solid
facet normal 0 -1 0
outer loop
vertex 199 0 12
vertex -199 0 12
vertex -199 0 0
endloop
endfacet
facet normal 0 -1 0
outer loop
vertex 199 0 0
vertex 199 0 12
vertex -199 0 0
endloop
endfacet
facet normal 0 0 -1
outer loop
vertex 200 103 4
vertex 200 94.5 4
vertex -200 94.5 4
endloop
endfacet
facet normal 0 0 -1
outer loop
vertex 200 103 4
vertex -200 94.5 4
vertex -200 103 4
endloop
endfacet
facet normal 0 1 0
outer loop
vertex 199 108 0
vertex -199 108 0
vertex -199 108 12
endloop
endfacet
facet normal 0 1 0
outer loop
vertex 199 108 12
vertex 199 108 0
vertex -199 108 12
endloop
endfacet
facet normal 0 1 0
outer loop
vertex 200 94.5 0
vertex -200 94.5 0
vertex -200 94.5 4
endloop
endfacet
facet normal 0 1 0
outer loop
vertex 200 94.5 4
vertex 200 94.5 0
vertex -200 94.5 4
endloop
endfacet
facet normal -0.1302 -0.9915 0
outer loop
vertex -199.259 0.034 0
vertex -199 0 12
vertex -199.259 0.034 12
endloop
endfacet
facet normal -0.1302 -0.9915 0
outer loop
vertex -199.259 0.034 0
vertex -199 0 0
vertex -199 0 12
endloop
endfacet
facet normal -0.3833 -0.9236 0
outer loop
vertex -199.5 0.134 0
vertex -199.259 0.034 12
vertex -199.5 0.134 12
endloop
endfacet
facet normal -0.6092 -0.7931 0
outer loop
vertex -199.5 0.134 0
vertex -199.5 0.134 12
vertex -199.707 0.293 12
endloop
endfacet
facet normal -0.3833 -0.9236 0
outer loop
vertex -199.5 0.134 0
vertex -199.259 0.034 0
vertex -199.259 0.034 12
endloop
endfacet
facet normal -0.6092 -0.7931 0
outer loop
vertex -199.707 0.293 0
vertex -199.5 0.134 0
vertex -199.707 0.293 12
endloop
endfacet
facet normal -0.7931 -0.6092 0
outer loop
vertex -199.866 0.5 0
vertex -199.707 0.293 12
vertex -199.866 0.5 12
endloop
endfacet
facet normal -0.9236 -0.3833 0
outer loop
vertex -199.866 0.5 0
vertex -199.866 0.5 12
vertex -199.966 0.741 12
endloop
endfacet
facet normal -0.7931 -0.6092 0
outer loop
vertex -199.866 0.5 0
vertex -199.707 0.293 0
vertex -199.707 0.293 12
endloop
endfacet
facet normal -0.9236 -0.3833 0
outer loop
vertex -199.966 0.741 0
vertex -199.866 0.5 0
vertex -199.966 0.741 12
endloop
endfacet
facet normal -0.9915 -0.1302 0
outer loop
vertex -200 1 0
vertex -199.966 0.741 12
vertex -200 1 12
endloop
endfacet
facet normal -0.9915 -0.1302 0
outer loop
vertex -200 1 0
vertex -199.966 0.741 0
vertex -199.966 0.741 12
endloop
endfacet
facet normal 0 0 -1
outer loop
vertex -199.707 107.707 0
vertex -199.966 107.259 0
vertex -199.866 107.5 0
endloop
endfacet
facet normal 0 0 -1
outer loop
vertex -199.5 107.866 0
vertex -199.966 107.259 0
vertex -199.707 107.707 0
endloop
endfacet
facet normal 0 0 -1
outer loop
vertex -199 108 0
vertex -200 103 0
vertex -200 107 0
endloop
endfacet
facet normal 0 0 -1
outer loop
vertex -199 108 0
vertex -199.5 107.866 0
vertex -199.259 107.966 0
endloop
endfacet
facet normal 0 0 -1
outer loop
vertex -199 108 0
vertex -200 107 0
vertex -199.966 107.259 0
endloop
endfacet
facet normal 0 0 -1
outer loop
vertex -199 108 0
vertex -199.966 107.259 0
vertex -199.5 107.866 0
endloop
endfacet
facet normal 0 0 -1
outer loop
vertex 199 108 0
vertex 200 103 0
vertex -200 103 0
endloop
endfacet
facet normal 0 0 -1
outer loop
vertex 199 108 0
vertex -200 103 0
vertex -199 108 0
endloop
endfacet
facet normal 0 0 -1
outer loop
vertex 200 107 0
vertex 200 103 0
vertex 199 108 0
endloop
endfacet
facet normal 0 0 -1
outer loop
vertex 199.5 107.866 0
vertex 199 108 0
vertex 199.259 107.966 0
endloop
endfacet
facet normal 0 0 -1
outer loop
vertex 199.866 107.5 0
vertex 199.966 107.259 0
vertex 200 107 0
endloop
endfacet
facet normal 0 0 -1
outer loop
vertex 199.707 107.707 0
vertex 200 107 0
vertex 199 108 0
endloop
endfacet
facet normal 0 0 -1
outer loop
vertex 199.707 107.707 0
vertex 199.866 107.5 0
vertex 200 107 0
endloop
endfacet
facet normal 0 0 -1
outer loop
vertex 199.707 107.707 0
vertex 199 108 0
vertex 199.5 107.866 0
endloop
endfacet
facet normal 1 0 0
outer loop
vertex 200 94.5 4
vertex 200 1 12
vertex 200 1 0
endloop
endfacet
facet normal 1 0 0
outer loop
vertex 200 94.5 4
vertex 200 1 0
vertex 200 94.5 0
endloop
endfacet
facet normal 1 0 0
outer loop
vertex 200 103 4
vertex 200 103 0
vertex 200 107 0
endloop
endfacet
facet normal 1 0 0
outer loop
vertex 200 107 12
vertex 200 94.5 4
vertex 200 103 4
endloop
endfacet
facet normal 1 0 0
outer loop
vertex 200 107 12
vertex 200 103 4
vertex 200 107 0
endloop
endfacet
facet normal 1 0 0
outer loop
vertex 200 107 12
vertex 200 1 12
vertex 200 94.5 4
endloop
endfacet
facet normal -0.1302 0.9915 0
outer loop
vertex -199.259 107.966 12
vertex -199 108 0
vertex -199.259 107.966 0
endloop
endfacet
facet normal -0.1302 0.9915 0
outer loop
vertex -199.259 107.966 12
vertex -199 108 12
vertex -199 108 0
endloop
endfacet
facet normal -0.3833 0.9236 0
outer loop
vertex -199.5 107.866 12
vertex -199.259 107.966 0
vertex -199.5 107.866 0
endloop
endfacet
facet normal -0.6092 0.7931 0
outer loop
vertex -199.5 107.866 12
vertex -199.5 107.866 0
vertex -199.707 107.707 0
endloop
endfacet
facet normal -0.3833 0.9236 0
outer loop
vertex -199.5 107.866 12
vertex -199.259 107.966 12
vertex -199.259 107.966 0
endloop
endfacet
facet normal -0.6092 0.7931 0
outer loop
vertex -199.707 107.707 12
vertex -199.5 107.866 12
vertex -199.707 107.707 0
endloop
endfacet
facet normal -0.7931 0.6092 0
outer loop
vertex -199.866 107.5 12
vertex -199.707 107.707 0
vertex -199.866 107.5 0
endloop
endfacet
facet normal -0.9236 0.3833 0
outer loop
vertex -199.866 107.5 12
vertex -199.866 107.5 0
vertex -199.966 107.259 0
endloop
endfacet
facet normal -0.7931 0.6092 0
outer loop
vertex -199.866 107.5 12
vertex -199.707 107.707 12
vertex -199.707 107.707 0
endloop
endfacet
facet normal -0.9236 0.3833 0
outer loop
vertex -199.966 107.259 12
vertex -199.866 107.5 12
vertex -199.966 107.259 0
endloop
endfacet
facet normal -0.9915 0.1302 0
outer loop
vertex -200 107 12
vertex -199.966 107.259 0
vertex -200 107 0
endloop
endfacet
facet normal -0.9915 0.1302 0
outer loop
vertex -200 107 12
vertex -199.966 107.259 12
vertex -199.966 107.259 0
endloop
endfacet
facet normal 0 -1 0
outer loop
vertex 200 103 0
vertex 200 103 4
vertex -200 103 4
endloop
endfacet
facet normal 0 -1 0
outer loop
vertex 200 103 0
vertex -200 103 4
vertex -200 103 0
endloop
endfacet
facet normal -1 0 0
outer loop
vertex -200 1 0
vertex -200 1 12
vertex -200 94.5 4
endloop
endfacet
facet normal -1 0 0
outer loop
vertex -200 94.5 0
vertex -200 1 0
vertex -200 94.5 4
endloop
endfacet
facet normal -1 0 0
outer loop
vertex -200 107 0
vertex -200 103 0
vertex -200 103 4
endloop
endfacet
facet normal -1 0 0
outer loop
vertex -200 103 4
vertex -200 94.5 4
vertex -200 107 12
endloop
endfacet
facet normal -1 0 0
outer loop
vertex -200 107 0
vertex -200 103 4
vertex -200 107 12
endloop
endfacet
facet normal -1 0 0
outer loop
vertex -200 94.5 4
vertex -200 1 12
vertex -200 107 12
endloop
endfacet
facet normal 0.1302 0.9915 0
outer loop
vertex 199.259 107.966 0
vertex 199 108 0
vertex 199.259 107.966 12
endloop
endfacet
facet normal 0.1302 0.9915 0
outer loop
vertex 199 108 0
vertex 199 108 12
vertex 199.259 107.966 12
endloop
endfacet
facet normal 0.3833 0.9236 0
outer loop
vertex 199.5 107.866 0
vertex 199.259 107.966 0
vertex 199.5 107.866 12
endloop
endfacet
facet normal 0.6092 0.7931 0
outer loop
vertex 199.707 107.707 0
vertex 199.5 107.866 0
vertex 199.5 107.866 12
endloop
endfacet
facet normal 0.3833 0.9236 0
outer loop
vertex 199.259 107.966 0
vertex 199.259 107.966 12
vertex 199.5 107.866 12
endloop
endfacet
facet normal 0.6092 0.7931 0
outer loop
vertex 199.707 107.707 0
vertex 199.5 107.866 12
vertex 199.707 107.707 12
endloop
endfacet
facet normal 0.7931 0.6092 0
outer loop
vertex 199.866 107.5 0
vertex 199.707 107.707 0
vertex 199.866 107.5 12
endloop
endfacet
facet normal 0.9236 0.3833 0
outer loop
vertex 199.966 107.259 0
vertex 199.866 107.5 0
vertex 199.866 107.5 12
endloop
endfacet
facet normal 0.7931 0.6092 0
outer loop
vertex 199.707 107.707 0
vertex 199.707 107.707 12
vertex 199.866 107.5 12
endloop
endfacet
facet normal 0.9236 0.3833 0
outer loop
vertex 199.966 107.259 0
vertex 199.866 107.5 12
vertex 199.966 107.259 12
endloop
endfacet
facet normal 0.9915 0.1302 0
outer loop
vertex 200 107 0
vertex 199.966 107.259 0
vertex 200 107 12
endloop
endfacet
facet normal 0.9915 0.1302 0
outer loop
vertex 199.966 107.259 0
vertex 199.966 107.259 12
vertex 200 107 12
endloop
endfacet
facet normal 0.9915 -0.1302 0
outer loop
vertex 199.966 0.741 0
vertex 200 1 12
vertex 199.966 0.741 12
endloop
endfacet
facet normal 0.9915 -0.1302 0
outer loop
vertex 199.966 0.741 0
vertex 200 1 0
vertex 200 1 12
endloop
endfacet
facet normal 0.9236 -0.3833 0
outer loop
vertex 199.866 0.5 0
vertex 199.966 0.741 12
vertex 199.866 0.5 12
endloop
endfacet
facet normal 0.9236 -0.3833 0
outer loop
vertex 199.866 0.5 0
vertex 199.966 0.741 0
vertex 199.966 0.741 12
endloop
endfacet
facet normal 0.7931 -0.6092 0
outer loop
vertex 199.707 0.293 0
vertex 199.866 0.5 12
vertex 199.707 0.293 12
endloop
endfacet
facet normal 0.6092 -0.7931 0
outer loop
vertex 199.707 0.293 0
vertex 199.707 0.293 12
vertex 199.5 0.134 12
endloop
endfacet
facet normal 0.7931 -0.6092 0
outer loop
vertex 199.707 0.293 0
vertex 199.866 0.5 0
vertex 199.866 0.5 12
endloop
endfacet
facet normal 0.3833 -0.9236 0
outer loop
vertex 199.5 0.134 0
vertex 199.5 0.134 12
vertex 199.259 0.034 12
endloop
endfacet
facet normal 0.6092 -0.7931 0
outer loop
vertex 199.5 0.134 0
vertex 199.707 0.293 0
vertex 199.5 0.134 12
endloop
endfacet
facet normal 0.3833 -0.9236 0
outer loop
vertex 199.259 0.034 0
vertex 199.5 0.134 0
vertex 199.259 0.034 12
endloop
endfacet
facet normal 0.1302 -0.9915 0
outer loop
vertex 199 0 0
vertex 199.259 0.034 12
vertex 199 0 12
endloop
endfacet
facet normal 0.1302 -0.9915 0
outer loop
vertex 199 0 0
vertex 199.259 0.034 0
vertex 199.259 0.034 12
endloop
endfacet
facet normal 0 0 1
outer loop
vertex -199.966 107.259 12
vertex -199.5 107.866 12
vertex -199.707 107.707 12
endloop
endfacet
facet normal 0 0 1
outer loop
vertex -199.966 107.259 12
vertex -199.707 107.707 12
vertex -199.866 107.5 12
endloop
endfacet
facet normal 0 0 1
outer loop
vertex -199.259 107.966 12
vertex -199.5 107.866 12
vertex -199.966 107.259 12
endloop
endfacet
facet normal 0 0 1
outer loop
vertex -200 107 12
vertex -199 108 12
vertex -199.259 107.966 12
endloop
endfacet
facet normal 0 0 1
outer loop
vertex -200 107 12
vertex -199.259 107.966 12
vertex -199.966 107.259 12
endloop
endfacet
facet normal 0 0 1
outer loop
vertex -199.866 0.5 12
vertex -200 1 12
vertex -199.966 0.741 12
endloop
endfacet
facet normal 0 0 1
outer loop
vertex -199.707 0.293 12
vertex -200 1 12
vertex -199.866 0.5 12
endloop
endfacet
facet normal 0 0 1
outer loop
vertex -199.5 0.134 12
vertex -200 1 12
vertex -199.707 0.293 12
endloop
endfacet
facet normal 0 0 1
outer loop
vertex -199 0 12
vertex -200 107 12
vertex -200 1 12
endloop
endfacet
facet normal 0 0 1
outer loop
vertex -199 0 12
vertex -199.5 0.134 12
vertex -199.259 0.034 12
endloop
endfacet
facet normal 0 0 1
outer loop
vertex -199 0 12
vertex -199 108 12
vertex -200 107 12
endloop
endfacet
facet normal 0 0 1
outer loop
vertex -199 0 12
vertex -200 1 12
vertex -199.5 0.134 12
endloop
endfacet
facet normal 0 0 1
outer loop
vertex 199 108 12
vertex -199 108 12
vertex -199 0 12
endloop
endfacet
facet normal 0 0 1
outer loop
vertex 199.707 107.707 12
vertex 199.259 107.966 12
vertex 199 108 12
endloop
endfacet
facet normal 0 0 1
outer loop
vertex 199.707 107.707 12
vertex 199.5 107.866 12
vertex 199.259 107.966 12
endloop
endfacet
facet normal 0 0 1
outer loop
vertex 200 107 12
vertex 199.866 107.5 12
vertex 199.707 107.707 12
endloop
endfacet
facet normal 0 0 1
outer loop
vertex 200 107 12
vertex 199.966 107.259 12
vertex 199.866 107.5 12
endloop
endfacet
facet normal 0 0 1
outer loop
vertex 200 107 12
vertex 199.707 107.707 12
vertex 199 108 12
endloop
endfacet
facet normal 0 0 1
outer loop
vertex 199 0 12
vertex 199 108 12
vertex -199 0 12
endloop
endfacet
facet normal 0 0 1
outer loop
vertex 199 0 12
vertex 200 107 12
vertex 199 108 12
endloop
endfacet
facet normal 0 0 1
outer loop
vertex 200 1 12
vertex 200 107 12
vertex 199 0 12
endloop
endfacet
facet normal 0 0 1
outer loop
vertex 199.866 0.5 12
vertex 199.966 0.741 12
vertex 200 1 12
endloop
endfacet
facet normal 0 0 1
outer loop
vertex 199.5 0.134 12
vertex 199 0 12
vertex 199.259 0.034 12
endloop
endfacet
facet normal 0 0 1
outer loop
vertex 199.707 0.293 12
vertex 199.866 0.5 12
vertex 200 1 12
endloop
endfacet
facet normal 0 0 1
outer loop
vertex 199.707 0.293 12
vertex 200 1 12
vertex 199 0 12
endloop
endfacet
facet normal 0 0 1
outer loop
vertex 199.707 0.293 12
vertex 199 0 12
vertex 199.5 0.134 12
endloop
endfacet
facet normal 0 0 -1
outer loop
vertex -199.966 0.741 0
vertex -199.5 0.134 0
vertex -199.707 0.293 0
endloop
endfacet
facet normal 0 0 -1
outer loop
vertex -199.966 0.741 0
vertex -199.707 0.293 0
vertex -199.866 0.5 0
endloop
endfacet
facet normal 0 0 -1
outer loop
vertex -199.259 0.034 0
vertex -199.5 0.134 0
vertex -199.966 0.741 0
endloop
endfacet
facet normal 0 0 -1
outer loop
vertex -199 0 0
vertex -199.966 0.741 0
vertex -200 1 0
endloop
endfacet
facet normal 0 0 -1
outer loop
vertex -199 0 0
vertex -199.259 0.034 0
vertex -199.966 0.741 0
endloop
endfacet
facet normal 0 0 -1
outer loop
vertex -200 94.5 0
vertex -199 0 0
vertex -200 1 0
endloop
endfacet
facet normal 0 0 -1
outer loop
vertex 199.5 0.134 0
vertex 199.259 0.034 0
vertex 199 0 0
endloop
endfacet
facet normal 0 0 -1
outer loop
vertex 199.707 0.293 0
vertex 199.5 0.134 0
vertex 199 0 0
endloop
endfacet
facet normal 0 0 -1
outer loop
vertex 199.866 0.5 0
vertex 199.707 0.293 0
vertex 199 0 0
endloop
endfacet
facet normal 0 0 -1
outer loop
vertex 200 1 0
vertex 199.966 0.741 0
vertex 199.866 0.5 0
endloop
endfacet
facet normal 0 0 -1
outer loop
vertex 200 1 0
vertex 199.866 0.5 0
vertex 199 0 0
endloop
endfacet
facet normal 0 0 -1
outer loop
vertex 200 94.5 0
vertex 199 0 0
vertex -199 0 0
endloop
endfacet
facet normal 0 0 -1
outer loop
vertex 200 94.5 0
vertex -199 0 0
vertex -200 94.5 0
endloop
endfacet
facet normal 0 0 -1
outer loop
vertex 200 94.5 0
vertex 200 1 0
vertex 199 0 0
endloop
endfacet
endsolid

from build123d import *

# Parameters (mm, degrees)
F1_DEPTH = 200
F2_R     = 1


with BuildPart() as f1:
    # F0 (on Right) → F1 (new body, symmetric)
    with BuildSketch(Plane.YZ):
        Polygon((108, 12), (0, 12), (0, 0), (94.5, 0), (94.5, 4), (103, 4), (103, 0), (108, 0), align=None)
    extrude(amount=F1_DEPTH, both=True)

    # F2
    f2_edges = [f1.edges().sort_by_distance(p)[0] for p in [
        (200, 0, 6),
        (200, 108, 6),
        (-200, 108, 6),
        (-200, 0, 6),
    ]]
    fillet(f2_edges, radius=F2_R)


solid = f1.part
